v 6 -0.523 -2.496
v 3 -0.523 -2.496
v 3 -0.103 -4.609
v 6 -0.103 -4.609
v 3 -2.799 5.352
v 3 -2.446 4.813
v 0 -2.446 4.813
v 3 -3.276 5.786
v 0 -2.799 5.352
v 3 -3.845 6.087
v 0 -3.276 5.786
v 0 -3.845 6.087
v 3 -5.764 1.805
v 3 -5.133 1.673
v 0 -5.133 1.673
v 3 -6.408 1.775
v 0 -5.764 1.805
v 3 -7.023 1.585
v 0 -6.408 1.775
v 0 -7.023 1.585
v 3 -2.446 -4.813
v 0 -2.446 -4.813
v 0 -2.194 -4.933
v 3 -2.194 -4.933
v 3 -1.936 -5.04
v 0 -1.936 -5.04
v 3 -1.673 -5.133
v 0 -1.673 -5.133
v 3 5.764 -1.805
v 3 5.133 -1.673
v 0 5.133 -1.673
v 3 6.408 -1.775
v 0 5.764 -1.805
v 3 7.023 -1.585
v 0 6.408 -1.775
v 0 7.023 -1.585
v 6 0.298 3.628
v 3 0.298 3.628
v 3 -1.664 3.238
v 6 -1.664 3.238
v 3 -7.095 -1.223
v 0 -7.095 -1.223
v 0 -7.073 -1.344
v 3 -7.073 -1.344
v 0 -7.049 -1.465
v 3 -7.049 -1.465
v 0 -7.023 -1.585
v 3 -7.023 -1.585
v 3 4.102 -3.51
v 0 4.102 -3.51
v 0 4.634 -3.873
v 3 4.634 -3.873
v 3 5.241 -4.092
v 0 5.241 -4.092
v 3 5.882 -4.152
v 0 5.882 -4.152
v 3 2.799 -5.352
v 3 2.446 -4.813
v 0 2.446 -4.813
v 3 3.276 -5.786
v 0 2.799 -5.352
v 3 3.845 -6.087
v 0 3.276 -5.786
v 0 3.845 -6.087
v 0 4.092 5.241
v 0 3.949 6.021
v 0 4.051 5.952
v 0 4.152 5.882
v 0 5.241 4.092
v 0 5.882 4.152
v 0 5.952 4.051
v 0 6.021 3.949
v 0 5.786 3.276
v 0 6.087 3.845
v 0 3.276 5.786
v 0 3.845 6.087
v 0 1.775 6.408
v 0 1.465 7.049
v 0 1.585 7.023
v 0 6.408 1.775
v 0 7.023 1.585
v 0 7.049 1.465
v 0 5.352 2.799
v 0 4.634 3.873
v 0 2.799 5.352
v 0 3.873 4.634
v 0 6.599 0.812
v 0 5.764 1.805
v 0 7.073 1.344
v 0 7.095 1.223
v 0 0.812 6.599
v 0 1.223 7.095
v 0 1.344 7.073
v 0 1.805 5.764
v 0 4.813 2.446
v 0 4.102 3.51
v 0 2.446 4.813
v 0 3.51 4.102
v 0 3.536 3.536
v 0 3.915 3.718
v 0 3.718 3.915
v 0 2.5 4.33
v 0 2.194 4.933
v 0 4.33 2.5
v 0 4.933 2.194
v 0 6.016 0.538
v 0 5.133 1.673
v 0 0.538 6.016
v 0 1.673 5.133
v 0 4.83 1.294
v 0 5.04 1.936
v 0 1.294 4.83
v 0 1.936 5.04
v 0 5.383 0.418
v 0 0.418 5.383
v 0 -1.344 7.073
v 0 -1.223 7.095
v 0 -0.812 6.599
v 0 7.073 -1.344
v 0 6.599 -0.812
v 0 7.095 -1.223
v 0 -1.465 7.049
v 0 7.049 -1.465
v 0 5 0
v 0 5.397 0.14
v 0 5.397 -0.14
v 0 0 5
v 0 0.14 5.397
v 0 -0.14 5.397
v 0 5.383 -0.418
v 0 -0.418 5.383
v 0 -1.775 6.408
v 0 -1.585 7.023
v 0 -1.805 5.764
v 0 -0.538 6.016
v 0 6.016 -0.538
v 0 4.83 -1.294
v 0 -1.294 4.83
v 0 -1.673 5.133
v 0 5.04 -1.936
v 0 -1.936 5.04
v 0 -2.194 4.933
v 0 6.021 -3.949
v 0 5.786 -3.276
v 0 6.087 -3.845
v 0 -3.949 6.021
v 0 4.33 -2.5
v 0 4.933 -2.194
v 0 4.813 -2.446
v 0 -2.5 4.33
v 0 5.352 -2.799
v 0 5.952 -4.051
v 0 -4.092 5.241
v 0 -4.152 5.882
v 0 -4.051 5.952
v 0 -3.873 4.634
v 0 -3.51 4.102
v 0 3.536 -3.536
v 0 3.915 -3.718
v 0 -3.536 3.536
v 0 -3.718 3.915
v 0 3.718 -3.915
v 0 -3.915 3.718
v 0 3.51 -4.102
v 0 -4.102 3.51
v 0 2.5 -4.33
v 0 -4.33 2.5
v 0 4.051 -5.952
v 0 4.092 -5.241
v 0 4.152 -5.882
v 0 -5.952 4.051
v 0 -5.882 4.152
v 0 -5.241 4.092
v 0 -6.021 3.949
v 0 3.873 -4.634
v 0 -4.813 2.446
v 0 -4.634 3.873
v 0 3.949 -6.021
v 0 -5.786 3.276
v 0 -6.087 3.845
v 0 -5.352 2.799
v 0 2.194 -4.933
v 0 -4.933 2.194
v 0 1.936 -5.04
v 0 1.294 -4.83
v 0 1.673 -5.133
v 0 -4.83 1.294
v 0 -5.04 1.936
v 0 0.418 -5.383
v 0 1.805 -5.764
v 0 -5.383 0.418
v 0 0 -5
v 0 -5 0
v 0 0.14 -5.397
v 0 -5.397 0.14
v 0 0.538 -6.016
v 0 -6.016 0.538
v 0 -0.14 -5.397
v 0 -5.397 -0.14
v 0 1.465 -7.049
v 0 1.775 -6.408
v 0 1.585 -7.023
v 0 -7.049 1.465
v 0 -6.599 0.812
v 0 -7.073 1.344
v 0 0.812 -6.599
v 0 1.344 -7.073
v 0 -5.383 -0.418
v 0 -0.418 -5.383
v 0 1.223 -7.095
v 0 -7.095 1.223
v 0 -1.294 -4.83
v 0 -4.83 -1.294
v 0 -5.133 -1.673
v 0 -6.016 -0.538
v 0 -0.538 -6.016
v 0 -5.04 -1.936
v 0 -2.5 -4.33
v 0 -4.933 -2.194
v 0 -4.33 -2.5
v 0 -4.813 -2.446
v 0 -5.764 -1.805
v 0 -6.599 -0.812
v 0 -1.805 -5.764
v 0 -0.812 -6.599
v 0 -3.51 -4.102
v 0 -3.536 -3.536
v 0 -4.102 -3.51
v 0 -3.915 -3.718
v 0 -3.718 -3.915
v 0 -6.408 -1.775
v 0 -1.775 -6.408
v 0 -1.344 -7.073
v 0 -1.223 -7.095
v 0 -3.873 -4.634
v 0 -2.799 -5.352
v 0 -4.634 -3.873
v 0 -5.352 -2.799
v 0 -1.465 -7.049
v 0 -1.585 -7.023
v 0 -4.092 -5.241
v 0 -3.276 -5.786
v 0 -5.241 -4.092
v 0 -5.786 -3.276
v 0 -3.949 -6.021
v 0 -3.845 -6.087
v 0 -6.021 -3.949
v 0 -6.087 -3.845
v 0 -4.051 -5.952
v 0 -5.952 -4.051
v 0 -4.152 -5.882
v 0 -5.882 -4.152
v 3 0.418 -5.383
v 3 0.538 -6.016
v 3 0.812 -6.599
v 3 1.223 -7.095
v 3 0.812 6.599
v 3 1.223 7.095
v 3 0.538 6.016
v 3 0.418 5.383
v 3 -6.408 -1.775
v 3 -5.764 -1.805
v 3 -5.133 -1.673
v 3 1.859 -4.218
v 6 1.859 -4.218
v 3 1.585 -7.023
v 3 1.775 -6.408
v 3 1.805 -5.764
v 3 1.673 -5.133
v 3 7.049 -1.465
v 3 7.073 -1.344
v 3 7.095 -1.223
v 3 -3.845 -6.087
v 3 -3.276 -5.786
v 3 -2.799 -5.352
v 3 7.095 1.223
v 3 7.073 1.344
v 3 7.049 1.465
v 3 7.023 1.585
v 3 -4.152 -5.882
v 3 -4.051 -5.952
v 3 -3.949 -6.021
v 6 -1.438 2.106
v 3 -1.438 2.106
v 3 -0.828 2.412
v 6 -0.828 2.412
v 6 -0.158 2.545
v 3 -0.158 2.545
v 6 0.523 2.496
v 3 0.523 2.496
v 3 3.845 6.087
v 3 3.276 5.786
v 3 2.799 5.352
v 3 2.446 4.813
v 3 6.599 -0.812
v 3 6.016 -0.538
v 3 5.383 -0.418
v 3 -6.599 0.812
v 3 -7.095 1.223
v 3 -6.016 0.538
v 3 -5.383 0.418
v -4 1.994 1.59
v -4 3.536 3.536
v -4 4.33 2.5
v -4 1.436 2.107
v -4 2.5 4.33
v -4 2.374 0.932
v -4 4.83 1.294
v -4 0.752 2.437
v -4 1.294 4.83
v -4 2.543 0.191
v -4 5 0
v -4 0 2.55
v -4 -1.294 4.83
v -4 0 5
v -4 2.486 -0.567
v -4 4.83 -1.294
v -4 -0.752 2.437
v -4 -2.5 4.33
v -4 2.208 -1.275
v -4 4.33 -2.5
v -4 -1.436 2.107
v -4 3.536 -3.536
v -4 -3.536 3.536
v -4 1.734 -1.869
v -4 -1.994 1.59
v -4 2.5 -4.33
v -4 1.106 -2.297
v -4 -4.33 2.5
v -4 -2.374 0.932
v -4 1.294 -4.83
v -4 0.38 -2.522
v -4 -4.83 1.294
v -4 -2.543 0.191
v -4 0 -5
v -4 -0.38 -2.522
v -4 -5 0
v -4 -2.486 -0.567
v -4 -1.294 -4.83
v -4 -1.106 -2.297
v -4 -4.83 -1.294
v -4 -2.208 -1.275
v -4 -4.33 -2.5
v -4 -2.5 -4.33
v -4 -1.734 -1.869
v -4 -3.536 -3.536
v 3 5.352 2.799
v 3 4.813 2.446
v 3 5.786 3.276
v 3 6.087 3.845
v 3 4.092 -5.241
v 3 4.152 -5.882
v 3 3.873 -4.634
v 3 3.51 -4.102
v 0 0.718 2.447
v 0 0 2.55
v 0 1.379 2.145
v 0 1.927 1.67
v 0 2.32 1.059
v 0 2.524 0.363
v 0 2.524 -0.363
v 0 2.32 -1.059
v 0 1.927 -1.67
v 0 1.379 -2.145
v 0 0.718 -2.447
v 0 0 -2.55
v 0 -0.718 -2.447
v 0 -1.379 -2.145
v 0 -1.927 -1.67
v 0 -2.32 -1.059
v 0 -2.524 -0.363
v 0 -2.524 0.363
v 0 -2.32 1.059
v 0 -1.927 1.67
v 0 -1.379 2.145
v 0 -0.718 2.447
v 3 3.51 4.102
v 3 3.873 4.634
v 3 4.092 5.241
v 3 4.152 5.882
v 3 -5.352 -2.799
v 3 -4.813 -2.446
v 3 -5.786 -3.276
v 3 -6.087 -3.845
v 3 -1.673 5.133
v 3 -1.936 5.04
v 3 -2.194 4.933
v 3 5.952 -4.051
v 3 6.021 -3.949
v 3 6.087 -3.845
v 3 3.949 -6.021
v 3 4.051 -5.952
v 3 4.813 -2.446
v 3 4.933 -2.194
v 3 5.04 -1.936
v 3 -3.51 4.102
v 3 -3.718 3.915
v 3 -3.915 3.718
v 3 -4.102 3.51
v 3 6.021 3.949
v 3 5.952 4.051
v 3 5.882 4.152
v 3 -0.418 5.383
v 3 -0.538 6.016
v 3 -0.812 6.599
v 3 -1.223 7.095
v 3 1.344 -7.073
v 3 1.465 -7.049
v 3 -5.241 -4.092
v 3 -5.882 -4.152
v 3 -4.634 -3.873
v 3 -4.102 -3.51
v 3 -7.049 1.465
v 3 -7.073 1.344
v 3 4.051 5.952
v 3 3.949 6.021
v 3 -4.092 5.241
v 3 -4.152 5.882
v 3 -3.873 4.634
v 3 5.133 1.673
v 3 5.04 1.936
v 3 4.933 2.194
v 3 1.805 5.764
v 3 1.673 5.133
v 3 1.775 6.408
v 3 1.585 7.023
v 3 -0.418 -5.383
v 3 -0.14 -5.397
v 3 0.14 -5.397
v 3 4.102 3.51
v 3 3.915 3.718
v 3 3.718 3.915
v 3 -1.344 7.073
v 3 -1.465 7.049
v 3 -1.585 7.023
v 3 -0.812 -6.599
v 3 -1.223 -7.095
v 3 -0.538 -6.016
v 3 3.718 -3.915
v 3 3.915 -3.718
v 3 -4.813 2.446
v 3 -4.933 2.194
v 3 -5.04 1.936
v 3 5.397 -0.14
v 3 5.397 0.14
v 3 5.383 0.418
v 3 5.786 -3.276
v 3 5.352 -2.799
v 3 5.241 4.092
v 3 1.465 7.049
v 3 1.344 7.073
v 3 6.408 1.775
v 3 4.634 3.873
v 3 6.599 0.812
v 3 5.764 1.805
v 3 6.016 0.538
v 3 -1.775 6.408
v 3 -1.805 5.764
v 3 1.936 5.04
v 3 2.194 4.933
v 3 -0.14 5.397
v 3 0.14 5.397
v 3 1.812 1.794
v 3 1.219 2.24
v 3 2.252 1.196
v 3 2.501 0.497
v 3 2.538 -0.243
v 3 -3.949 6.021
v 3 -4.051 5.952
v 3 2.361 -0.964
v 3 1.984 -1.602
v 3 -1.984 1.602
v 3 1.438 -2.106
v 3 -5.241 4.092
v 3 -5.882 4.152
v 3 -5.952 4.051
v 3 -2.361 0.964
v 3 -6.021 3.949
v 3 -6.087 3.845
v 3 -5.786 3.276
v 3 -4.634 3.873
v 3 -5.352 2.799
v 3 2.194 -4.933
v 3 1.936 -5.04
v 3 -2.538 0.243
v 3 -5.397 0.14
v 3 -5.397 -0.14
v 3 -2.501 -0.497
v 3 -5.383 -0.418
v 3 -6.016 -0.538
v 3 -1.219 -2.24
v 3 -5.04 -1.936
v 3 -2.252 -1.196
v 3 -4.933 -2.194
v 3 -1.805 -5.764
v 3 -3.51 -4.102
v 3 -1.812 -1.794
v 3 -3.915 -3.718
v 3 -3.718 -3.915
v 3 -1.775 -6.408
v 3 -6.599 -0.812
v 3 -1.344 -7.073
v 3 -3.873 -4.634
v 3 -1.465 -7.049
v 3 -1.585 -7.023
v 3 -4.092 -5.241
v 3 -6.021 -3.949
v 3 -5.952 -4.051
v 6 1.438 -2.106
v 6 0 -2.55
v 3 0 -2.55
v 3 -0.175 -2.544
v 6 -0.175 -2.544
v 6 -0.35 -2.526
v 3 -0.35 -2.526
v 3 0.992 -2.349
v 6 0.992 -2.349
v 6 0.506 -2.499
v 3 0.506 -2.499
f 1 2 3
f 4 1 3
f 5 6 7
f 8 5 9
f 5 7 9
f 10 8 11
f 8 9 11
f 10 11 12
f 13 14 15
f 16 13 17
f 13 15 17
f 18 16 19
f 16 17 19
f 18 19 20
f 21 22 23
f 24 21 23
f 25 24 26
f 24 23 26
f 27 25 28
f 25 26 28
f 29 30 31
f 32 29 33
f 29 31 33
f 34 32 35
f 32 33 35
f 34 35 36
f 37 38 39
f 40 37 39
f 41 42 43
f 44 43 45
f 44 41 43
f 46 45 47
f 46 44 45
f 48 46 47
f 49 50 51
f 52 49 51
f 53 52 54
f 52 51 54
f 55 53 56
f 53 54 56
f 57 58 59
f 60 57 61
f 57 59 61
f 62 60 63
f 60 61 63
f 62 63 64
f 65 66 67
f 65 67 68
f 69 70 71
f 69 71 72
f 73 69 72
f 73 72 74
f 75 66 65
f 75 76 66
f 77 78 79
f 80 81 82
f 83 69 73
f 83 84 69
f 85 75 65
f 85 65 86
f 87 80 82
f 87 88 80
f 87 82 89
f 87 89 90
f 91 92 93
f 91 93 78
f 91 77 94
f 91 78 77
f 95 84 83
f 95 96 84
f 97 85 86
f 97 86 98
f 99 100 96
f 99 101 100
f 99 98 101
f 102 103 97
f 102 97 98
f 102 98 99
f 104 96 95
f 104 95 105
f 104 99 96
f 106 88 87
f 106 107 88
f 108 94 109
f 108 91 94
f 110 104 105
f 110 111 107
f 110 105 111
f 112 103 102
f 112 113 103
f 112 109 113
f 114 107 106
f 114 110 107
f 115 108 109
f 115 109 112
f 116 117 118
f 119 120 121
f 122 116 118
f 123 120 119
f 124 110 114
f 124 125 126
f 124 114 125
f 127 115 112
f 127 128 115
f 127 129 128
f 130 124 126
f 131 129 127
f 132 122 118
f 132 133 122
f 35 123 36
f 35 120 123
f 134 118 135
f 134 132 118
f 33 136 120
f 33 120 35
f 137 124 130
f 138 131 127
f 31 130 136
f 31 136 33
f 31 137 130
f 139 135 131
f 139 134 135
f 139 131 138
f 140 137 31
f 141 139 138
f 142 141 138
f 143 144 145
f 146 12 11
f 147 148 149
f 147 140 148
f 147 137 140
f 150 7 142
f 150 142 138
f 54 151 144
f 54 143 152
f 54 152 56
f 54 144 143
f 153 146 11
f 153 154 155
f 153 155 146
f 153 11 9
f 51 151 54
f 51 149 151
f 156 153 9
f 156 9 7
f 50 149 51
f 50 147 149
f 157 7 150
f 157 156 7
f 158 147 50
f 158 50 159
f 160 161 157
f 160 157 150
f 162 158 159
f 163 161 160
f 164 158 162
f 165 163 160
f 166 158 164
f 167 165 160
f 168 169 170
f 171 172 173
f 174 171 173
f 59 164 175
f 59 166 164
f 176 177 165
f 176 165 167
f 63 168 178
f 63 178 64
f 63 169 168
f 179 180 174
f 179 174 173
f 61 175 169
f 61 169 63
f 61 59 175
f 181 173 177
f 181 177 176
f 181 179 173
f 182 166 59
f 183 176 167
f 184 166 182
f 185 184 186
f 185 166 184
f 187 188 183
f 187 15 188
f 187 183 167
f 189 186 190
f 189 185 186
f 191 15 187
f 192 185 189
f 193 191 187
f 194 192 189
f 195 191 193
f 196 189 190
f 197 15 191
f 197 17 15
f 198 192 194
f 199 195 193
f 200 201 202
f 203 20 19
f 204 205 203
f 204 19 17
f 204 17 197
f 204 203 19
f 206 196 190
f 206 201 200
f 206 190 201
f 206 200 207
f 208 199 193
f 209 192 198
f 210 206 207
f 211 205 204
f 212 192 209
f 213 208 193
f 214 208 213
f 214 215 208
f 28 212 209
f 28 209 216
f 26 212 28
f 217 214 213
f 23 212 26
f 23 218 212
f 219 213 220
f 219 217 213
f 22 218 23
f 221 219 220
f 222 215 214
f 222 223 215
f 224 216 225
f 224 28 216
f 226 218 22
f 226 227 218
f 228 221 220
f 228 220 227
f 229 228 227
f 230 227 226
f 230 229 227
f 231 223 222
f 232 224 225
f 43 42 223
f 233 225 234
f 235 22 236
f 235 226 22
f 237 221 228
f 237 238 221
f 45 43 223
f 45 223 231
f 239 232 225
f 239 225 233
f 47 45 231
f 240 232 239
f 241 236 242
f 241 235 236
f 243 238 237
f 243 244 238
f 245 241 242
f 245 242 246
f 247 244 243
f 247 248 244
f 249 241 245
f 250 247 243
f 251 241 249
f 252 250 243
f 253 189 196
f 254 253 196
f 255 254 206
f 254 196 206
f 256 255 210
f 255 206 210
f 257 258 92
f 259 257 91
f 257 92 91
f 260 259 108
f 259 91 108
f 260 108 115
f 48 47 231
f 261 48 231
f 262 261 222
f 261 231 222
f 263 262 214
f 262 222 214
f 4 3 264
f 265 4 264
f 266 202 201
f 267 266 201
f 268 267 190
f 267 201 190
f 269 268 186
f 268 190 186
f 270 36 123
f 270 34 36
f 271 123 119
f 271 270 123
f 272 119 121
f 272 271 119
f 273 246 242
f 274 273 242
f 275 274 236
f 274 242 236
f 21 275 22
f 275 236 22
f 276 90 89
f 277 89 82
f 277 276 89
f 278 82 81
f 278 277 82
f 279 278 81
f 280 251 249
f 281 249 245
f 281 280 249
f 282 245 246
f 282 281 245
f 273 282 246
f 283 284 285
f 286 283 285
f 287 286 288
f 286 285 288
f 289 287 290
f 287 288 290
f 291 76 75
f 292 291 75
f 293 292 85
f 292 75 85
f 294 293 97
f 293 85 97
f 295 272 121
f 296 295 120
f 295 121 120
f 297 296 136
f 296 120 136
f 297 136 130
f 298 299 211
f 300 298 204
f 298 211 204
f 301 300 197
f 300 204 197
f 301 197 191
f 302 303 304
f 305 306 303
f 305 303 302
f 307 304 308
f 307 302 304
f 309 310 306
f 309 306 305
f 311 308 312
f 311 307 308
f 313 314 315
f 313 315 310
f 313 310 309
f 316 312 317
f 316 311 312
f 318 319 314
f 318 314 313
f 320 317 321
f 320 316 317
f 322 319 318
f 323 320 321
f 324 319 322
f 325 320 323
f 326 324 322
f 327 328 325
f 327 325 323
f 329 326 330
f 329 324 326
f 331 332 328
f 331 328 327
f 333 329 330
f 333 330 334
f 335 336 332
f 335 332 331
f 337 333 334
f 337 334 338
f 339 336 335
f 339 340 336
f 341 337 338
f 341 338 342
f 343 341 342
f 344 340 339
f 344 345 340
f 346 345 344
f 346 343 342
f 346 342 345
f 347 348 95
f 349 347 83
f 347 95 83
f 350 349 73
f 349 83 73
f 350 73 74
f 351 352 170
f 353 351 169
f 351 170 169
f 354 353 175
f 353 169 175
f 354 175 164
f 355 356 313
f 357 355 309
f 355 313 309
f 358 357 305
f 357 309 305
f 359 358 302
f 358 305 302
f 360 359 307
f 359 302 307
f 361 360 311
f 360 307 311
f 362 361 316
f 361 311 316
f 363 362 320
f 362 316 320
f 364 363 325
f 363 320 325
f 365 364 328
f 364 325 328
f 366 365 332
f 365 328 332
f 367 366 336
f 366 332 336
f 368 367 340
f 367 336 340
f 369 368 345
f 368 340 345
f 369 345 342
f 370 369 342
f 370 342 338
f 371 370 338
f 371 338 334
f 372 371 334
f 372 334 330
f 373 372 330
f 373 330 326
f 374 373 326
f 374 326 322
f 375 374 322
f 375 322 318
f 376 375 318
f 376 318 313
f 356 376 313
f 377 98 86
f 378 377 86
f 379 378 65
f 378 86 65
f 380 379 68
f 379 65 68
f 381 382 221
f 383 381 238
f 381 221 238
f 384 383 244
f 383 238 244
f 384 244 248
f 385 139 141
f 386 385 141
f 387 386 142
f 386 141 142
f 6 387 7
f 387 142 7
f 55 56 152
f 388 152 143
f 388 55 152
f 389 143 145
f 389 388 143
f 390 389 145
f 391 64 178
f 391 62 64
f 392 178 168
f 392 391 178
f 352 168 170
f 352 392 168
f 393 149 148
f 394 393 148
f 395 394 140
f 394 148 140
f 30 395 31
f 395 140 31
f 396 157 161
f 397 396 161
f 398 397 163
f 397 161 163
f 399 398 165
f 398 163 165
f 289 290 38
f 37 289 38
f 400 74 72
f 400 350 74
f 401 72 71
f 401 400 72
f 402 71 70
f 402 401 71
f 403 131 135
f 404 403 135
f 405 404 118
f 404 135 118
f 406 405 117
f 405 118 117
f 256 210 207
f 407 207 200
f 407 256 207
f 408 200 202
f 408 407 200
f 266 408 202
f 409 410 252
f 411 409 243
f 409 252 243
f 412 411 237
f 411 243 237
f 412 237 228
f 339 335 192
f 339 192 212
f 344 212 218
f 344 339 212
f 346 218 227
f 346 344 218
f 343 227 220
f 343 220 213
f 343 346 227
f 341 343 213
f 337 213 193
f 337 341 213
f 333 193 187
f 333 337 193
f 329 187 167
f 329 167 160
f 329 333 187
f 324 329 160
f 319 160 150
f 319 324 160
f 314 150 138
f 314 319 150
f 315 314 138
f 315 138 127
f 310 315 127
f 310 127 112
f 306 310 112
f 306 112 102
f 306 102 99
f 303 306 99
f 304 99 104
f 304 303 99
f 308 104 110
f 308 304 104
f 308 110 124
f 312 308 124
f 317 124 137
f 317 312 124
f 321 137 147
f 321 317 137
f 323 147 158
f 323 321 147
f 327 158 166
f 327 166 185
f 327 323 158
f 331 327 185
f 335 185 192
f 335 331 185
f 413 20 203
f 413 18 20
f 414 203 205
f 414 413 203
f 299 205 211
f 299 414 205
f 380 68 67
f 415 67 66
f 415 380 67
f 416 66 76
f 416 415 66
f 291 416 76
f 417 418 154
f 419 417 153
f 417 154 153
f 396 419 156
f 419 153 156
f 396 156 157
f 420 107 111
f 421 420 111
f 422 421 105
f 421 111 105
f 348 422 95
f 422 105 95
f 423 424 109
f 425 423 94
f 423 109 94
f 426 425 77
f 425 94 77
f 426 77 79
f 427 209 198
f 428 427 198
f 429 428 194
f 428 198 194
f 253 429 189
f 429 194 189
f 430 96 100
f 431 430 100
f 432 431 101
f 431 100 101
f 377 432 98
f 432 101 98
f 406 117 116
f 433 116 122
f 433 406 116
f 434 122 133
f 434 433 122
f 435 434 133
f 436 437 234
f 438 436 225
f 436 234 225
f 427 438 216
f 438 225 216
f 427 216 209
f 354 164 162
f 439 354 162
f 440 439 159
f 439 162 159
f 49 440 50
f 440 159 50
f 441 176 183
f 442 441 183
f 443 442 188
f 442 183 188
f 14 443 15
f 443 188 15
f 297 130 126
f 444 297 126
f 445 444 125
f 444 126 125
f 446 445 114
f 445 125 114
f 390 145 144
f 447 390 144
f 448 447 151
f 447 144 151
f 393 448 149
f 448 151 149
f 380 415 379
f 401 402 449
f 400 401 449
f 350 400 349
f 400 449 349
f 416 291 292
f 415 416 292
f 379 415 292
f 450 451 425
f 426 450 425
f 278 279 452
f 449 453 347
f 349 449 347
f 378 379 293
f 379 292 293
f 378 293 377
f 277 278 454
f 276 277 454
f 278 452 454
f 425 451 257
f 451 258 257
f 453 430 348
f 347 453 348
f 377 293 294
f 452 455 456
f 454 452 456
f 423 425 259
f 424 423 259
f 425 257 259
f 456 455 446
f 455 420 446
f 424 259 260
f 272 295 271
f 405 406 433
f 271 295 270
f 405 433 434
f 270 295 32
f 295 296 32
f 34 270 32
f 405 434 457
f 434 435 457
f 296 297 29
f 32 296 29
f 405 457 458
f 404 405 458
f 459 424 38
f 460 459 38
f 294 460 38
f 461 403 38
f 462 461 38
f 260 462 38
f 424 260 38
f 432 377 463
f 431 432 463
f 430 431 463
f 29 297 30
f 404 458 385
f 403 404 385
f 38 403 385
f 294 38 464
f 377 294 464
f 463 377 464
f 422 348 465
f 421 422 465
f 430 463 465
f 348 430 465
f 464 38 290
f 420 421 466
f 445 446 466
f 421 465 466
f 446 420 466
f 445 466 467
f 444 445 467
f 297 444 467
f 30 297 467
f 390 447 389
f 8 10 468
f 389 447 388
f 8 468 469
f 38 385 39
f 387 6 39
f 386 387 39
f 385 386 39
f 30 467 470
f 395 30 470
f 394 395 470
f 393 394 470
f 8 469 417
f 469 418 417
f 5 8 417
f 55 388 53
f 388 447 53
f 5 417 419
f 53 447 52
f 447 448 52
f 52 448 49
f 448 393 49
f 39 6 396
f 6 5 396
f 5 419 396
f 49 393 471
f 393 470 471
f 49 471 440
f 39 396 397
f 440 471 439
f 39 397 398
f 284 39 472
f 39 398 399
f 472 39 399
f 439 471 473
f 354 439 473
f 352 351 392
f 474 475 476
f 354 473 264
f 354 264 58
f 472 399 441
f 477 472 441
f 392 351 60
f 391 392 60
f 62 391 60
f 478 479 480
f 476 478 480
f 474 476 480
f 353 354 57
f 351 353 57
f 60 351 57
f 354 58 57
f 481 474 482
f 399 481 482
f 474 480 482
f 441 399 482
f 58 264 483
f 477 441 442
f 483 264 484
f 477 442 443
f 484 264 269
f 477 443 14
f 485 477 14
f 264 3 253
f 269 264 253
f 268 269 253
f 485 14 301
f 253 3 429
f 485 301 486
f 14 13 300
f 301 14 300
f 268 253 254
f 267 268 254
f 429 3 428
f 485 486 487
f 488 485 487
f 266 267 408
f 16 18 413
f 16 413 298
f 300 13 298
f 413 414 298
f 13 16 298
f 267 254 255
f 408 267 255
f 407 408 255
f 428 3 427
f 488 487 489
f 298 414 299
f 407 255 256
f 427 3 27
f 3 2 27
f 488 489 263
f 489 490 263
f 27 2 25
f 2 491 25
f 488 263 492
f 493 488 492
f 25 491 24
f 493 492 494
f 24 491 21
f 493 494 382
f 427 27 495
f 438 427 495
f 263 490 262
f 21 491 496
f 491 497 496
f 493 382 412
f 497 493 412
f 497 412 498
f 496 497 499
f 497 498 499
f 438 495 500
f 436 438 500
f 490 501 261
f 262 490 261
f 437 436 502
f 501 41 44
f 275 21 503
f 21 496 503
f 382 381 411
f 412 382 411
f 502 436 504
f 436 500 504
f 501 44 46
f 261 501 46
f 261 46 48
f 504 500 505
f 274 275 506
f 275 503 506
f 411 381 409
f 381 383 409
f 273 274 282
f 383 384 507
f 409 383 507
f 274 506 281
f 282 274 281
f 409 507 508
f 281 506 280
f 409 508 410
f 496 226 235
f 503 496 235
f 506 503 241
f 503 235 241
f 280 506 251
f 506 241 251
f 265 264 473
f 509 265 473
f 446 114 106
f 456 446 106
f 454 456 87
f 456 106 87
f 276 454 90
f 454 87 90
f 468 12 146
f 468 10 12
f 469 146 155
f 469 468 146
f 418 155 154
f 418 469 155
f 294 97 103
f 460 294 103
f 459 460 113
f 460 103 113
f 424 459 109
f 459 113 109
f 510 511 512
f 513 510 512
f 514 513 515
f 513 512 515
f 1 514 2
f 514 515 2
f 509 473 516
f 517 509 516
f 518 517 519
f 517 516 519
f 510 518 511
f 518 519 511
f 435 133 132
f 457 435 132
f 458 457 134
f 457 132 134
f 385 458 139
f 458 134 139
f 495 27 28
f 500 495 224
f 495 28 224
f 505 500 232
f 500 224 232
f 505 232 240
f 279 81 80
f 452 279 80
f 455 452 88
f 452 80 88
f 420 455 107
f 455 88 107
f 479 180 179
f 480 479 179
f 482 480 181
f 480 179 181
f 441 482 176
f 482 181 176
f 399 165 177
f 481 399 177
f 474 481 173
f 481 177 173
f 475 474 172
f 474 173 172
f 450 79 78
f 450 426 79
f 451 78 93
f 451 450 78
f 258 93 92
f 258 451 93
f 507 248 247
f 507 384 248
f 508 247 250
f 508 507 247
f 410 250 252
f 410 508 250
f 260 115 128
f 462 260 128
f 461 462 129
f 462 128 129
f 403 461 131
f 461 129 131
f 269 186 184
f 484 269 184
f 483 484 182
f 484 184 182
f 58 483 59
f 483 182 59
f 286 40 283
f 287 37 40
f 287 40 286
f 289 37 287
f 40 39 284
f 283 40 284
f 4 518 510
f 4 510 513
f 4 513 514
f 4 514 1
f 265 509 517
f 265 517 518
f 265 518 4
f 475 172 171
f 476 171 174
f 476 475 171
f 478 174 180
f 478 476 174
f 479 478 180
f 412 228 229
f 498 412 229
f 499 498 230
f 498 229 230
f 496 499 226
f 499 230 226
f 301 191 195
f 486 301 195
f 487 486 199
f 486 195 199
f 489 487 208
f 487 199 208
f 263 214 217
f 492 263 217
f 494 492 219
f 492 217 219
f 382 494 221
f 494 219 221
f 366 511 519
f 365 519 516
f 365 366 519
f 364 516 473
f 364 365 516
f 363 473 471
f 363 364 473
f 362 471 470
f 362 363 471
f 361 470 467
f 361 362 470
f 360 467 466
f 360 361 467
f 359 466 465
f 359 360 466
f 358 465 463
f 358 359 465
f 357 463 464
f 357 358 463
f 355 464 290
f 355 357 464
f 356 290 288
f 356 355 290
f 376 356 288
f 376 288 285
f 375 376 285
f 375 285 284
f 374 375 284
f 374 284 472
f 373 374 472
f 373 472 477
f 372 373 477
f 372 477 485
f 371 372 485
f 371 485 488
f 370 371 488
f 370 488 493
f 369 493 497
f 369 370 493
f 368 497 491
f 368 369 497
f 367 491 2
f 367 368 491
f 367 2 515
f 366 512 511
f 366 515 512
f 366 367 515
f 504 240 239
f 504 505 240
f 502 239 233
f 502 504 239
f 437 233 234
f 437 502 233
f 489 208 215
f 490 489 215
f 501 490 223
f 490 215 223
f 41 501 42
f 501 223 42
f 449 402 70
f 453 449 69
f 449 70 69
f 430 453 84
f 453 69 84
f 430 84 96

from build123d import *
from build123d.topology import SkipClean

# Parameters (mm, degrees)
BASPROSKE_W         = 3
BASPROSKE_H         = 7.2
TOOTHCUT_DEPTH      = 11.615083608
TEETHCUTS_COUNT     = 16
BORSKE_R            = 0.5
BORE_DEPTH          = 50.0000508
SKETCH_1_R          = 2.55
CUT_EXTRUDE_1_DEPTH = 11.473188484
EXTRUDE_START       = 4
SKETCH_3_R          = 5
SKETCH_3_R_2        = 2.55
EXTRUDE_2_DEPTH     = 4
EXTRUDE_1_DEPTH     = 3


with BuildPart() as part:
    # BasProSke → Base-Revolve (revolve)
    with BuildSketch(Plane(origin=(0, 0, 0), x_dir=(1, 0, 0), z_dir=(0, 1, 0))):
        with Locations((1.5, 3.6)):
            Rectangle(BASPROSKE_W, BASPROSKE_H)
    revolve(axis=Axis((-10, 0, 0), (1, 0, 0)))

    # TooCutSke → ToothCut (cut, through all)
    with BuildSketch(Plane(origin=(0, 0, 0), x_dir=(0, 0, -1), z_dir=(1, 0, 0))):
        with BuildLine():
            ThreePointArc((0.418431057, 5.382761043), (0, 5.399), (-0.418431057, 5.382761043))
            ThreePointArc((-0.418431057, 5.382761043), (-0.663605074, 6.330572066), (-1.246629414, 7.117044349))
            ThreePointArc((-1.246629414, 7.117044349), (0, 7.2254), (1.246629414, 7.117044349))
            ThreePointArc((1.246629414, 7.117044349), (0.663605074, 6.330572066), (0.418431057, 5.382761043))
        make_face()
    toothcut = extrude(amount=TOOTHCUT_DEPTH, mode=Mode.SUBTRACT)

    # TeethCuts: ToothCut ×16 about axis
    teethcuts_axis = Axis((-10, 0, 0), (1, 0, 0))
    for i in range(1, TEETHCUTS_COUNT):
        add(toothcut.rotate(teethcuts_axis, i * 360 / TEETHCUTS_COUNT), mode=Mode.SUBTRACT)

    # BorSke → Bore (cut, symmetric)
    with BuildSketch(Plane(origin=(0, 0, 0), x_dir=(0, 0, -1), z_dir=(1, 0, 0))):
        Circle(BORSKE_R)
    extrude(amount=BORE_DEPTH, both=True, mode=Mode.SUBTRACT)

    # 草图1 → 切除-拉伸1 (cut, through all)
    with BuildSketch(Plane(origin=(0, 0, 0), x_dir=(0, 0, -1), z_dir=(1, 0, 0))):
        Circle(SKETCH_1_R)
    extrude(amount=CUT_EXTRUDE_1_DEPTH, mode=Mode.SUBTRACT)

    # 草图3 → 凸台-拉伸2 (add)
    with SkipClean():  # the faces are left unmerged after this step: merging them gives an invalid solid
        with BuildSketch(Plane.ZY.offset(EXTRUDE_START)):
            Circle(SKETCH_3_R)
            Circle(SKETCH_3_R_2, mode=Mode.SUBTRACT)
        extrude(amount=-EXTRUDE_2_DEPTH)

    # 草图2 → 凸台-拉伸1 (add)
    with SkipClean():  # the faces are left unmerged after this step: merging them gives an invalid solid
        with BuildSketch(Plane(origin=(3, 0, 0), x_dir=(0, 0, -1), z_dir=(1, 0, 0))):
            with BuildLine():
                Line((4.608624084, -0.102878831), (4.21844344, 1.858691729))
                Line((4.21844344, 1.858691729), (2.105577747, 1.438416613))
                ThreePointArc((2.105577747, 1.438416613), (2.501002465, 0.497480321), (2.495758391, -0.523153948))
                Line((2.495758391, -0.523153948), (4.608624084, -0.102878831))
            make_face()
            with BuildLine():
                ThreePointArc((-2.105577747, -1.438416613), (-2.501002465, -0.497480321), (-2.495758391, 0.523153948))
                Line((-2.495758391, 0.523153948), (-3.627838803, 0.297969153))
                Line((-3.627838803, 0.297969153), (-3.237658159, -1.663601407))
                Line((-3.237658159, -1.663601407), (-2.105577747, -1.438416613))
            make_face()
        extrude(amount=EXTRUDE_1_DEPTH)


solid = part.part
